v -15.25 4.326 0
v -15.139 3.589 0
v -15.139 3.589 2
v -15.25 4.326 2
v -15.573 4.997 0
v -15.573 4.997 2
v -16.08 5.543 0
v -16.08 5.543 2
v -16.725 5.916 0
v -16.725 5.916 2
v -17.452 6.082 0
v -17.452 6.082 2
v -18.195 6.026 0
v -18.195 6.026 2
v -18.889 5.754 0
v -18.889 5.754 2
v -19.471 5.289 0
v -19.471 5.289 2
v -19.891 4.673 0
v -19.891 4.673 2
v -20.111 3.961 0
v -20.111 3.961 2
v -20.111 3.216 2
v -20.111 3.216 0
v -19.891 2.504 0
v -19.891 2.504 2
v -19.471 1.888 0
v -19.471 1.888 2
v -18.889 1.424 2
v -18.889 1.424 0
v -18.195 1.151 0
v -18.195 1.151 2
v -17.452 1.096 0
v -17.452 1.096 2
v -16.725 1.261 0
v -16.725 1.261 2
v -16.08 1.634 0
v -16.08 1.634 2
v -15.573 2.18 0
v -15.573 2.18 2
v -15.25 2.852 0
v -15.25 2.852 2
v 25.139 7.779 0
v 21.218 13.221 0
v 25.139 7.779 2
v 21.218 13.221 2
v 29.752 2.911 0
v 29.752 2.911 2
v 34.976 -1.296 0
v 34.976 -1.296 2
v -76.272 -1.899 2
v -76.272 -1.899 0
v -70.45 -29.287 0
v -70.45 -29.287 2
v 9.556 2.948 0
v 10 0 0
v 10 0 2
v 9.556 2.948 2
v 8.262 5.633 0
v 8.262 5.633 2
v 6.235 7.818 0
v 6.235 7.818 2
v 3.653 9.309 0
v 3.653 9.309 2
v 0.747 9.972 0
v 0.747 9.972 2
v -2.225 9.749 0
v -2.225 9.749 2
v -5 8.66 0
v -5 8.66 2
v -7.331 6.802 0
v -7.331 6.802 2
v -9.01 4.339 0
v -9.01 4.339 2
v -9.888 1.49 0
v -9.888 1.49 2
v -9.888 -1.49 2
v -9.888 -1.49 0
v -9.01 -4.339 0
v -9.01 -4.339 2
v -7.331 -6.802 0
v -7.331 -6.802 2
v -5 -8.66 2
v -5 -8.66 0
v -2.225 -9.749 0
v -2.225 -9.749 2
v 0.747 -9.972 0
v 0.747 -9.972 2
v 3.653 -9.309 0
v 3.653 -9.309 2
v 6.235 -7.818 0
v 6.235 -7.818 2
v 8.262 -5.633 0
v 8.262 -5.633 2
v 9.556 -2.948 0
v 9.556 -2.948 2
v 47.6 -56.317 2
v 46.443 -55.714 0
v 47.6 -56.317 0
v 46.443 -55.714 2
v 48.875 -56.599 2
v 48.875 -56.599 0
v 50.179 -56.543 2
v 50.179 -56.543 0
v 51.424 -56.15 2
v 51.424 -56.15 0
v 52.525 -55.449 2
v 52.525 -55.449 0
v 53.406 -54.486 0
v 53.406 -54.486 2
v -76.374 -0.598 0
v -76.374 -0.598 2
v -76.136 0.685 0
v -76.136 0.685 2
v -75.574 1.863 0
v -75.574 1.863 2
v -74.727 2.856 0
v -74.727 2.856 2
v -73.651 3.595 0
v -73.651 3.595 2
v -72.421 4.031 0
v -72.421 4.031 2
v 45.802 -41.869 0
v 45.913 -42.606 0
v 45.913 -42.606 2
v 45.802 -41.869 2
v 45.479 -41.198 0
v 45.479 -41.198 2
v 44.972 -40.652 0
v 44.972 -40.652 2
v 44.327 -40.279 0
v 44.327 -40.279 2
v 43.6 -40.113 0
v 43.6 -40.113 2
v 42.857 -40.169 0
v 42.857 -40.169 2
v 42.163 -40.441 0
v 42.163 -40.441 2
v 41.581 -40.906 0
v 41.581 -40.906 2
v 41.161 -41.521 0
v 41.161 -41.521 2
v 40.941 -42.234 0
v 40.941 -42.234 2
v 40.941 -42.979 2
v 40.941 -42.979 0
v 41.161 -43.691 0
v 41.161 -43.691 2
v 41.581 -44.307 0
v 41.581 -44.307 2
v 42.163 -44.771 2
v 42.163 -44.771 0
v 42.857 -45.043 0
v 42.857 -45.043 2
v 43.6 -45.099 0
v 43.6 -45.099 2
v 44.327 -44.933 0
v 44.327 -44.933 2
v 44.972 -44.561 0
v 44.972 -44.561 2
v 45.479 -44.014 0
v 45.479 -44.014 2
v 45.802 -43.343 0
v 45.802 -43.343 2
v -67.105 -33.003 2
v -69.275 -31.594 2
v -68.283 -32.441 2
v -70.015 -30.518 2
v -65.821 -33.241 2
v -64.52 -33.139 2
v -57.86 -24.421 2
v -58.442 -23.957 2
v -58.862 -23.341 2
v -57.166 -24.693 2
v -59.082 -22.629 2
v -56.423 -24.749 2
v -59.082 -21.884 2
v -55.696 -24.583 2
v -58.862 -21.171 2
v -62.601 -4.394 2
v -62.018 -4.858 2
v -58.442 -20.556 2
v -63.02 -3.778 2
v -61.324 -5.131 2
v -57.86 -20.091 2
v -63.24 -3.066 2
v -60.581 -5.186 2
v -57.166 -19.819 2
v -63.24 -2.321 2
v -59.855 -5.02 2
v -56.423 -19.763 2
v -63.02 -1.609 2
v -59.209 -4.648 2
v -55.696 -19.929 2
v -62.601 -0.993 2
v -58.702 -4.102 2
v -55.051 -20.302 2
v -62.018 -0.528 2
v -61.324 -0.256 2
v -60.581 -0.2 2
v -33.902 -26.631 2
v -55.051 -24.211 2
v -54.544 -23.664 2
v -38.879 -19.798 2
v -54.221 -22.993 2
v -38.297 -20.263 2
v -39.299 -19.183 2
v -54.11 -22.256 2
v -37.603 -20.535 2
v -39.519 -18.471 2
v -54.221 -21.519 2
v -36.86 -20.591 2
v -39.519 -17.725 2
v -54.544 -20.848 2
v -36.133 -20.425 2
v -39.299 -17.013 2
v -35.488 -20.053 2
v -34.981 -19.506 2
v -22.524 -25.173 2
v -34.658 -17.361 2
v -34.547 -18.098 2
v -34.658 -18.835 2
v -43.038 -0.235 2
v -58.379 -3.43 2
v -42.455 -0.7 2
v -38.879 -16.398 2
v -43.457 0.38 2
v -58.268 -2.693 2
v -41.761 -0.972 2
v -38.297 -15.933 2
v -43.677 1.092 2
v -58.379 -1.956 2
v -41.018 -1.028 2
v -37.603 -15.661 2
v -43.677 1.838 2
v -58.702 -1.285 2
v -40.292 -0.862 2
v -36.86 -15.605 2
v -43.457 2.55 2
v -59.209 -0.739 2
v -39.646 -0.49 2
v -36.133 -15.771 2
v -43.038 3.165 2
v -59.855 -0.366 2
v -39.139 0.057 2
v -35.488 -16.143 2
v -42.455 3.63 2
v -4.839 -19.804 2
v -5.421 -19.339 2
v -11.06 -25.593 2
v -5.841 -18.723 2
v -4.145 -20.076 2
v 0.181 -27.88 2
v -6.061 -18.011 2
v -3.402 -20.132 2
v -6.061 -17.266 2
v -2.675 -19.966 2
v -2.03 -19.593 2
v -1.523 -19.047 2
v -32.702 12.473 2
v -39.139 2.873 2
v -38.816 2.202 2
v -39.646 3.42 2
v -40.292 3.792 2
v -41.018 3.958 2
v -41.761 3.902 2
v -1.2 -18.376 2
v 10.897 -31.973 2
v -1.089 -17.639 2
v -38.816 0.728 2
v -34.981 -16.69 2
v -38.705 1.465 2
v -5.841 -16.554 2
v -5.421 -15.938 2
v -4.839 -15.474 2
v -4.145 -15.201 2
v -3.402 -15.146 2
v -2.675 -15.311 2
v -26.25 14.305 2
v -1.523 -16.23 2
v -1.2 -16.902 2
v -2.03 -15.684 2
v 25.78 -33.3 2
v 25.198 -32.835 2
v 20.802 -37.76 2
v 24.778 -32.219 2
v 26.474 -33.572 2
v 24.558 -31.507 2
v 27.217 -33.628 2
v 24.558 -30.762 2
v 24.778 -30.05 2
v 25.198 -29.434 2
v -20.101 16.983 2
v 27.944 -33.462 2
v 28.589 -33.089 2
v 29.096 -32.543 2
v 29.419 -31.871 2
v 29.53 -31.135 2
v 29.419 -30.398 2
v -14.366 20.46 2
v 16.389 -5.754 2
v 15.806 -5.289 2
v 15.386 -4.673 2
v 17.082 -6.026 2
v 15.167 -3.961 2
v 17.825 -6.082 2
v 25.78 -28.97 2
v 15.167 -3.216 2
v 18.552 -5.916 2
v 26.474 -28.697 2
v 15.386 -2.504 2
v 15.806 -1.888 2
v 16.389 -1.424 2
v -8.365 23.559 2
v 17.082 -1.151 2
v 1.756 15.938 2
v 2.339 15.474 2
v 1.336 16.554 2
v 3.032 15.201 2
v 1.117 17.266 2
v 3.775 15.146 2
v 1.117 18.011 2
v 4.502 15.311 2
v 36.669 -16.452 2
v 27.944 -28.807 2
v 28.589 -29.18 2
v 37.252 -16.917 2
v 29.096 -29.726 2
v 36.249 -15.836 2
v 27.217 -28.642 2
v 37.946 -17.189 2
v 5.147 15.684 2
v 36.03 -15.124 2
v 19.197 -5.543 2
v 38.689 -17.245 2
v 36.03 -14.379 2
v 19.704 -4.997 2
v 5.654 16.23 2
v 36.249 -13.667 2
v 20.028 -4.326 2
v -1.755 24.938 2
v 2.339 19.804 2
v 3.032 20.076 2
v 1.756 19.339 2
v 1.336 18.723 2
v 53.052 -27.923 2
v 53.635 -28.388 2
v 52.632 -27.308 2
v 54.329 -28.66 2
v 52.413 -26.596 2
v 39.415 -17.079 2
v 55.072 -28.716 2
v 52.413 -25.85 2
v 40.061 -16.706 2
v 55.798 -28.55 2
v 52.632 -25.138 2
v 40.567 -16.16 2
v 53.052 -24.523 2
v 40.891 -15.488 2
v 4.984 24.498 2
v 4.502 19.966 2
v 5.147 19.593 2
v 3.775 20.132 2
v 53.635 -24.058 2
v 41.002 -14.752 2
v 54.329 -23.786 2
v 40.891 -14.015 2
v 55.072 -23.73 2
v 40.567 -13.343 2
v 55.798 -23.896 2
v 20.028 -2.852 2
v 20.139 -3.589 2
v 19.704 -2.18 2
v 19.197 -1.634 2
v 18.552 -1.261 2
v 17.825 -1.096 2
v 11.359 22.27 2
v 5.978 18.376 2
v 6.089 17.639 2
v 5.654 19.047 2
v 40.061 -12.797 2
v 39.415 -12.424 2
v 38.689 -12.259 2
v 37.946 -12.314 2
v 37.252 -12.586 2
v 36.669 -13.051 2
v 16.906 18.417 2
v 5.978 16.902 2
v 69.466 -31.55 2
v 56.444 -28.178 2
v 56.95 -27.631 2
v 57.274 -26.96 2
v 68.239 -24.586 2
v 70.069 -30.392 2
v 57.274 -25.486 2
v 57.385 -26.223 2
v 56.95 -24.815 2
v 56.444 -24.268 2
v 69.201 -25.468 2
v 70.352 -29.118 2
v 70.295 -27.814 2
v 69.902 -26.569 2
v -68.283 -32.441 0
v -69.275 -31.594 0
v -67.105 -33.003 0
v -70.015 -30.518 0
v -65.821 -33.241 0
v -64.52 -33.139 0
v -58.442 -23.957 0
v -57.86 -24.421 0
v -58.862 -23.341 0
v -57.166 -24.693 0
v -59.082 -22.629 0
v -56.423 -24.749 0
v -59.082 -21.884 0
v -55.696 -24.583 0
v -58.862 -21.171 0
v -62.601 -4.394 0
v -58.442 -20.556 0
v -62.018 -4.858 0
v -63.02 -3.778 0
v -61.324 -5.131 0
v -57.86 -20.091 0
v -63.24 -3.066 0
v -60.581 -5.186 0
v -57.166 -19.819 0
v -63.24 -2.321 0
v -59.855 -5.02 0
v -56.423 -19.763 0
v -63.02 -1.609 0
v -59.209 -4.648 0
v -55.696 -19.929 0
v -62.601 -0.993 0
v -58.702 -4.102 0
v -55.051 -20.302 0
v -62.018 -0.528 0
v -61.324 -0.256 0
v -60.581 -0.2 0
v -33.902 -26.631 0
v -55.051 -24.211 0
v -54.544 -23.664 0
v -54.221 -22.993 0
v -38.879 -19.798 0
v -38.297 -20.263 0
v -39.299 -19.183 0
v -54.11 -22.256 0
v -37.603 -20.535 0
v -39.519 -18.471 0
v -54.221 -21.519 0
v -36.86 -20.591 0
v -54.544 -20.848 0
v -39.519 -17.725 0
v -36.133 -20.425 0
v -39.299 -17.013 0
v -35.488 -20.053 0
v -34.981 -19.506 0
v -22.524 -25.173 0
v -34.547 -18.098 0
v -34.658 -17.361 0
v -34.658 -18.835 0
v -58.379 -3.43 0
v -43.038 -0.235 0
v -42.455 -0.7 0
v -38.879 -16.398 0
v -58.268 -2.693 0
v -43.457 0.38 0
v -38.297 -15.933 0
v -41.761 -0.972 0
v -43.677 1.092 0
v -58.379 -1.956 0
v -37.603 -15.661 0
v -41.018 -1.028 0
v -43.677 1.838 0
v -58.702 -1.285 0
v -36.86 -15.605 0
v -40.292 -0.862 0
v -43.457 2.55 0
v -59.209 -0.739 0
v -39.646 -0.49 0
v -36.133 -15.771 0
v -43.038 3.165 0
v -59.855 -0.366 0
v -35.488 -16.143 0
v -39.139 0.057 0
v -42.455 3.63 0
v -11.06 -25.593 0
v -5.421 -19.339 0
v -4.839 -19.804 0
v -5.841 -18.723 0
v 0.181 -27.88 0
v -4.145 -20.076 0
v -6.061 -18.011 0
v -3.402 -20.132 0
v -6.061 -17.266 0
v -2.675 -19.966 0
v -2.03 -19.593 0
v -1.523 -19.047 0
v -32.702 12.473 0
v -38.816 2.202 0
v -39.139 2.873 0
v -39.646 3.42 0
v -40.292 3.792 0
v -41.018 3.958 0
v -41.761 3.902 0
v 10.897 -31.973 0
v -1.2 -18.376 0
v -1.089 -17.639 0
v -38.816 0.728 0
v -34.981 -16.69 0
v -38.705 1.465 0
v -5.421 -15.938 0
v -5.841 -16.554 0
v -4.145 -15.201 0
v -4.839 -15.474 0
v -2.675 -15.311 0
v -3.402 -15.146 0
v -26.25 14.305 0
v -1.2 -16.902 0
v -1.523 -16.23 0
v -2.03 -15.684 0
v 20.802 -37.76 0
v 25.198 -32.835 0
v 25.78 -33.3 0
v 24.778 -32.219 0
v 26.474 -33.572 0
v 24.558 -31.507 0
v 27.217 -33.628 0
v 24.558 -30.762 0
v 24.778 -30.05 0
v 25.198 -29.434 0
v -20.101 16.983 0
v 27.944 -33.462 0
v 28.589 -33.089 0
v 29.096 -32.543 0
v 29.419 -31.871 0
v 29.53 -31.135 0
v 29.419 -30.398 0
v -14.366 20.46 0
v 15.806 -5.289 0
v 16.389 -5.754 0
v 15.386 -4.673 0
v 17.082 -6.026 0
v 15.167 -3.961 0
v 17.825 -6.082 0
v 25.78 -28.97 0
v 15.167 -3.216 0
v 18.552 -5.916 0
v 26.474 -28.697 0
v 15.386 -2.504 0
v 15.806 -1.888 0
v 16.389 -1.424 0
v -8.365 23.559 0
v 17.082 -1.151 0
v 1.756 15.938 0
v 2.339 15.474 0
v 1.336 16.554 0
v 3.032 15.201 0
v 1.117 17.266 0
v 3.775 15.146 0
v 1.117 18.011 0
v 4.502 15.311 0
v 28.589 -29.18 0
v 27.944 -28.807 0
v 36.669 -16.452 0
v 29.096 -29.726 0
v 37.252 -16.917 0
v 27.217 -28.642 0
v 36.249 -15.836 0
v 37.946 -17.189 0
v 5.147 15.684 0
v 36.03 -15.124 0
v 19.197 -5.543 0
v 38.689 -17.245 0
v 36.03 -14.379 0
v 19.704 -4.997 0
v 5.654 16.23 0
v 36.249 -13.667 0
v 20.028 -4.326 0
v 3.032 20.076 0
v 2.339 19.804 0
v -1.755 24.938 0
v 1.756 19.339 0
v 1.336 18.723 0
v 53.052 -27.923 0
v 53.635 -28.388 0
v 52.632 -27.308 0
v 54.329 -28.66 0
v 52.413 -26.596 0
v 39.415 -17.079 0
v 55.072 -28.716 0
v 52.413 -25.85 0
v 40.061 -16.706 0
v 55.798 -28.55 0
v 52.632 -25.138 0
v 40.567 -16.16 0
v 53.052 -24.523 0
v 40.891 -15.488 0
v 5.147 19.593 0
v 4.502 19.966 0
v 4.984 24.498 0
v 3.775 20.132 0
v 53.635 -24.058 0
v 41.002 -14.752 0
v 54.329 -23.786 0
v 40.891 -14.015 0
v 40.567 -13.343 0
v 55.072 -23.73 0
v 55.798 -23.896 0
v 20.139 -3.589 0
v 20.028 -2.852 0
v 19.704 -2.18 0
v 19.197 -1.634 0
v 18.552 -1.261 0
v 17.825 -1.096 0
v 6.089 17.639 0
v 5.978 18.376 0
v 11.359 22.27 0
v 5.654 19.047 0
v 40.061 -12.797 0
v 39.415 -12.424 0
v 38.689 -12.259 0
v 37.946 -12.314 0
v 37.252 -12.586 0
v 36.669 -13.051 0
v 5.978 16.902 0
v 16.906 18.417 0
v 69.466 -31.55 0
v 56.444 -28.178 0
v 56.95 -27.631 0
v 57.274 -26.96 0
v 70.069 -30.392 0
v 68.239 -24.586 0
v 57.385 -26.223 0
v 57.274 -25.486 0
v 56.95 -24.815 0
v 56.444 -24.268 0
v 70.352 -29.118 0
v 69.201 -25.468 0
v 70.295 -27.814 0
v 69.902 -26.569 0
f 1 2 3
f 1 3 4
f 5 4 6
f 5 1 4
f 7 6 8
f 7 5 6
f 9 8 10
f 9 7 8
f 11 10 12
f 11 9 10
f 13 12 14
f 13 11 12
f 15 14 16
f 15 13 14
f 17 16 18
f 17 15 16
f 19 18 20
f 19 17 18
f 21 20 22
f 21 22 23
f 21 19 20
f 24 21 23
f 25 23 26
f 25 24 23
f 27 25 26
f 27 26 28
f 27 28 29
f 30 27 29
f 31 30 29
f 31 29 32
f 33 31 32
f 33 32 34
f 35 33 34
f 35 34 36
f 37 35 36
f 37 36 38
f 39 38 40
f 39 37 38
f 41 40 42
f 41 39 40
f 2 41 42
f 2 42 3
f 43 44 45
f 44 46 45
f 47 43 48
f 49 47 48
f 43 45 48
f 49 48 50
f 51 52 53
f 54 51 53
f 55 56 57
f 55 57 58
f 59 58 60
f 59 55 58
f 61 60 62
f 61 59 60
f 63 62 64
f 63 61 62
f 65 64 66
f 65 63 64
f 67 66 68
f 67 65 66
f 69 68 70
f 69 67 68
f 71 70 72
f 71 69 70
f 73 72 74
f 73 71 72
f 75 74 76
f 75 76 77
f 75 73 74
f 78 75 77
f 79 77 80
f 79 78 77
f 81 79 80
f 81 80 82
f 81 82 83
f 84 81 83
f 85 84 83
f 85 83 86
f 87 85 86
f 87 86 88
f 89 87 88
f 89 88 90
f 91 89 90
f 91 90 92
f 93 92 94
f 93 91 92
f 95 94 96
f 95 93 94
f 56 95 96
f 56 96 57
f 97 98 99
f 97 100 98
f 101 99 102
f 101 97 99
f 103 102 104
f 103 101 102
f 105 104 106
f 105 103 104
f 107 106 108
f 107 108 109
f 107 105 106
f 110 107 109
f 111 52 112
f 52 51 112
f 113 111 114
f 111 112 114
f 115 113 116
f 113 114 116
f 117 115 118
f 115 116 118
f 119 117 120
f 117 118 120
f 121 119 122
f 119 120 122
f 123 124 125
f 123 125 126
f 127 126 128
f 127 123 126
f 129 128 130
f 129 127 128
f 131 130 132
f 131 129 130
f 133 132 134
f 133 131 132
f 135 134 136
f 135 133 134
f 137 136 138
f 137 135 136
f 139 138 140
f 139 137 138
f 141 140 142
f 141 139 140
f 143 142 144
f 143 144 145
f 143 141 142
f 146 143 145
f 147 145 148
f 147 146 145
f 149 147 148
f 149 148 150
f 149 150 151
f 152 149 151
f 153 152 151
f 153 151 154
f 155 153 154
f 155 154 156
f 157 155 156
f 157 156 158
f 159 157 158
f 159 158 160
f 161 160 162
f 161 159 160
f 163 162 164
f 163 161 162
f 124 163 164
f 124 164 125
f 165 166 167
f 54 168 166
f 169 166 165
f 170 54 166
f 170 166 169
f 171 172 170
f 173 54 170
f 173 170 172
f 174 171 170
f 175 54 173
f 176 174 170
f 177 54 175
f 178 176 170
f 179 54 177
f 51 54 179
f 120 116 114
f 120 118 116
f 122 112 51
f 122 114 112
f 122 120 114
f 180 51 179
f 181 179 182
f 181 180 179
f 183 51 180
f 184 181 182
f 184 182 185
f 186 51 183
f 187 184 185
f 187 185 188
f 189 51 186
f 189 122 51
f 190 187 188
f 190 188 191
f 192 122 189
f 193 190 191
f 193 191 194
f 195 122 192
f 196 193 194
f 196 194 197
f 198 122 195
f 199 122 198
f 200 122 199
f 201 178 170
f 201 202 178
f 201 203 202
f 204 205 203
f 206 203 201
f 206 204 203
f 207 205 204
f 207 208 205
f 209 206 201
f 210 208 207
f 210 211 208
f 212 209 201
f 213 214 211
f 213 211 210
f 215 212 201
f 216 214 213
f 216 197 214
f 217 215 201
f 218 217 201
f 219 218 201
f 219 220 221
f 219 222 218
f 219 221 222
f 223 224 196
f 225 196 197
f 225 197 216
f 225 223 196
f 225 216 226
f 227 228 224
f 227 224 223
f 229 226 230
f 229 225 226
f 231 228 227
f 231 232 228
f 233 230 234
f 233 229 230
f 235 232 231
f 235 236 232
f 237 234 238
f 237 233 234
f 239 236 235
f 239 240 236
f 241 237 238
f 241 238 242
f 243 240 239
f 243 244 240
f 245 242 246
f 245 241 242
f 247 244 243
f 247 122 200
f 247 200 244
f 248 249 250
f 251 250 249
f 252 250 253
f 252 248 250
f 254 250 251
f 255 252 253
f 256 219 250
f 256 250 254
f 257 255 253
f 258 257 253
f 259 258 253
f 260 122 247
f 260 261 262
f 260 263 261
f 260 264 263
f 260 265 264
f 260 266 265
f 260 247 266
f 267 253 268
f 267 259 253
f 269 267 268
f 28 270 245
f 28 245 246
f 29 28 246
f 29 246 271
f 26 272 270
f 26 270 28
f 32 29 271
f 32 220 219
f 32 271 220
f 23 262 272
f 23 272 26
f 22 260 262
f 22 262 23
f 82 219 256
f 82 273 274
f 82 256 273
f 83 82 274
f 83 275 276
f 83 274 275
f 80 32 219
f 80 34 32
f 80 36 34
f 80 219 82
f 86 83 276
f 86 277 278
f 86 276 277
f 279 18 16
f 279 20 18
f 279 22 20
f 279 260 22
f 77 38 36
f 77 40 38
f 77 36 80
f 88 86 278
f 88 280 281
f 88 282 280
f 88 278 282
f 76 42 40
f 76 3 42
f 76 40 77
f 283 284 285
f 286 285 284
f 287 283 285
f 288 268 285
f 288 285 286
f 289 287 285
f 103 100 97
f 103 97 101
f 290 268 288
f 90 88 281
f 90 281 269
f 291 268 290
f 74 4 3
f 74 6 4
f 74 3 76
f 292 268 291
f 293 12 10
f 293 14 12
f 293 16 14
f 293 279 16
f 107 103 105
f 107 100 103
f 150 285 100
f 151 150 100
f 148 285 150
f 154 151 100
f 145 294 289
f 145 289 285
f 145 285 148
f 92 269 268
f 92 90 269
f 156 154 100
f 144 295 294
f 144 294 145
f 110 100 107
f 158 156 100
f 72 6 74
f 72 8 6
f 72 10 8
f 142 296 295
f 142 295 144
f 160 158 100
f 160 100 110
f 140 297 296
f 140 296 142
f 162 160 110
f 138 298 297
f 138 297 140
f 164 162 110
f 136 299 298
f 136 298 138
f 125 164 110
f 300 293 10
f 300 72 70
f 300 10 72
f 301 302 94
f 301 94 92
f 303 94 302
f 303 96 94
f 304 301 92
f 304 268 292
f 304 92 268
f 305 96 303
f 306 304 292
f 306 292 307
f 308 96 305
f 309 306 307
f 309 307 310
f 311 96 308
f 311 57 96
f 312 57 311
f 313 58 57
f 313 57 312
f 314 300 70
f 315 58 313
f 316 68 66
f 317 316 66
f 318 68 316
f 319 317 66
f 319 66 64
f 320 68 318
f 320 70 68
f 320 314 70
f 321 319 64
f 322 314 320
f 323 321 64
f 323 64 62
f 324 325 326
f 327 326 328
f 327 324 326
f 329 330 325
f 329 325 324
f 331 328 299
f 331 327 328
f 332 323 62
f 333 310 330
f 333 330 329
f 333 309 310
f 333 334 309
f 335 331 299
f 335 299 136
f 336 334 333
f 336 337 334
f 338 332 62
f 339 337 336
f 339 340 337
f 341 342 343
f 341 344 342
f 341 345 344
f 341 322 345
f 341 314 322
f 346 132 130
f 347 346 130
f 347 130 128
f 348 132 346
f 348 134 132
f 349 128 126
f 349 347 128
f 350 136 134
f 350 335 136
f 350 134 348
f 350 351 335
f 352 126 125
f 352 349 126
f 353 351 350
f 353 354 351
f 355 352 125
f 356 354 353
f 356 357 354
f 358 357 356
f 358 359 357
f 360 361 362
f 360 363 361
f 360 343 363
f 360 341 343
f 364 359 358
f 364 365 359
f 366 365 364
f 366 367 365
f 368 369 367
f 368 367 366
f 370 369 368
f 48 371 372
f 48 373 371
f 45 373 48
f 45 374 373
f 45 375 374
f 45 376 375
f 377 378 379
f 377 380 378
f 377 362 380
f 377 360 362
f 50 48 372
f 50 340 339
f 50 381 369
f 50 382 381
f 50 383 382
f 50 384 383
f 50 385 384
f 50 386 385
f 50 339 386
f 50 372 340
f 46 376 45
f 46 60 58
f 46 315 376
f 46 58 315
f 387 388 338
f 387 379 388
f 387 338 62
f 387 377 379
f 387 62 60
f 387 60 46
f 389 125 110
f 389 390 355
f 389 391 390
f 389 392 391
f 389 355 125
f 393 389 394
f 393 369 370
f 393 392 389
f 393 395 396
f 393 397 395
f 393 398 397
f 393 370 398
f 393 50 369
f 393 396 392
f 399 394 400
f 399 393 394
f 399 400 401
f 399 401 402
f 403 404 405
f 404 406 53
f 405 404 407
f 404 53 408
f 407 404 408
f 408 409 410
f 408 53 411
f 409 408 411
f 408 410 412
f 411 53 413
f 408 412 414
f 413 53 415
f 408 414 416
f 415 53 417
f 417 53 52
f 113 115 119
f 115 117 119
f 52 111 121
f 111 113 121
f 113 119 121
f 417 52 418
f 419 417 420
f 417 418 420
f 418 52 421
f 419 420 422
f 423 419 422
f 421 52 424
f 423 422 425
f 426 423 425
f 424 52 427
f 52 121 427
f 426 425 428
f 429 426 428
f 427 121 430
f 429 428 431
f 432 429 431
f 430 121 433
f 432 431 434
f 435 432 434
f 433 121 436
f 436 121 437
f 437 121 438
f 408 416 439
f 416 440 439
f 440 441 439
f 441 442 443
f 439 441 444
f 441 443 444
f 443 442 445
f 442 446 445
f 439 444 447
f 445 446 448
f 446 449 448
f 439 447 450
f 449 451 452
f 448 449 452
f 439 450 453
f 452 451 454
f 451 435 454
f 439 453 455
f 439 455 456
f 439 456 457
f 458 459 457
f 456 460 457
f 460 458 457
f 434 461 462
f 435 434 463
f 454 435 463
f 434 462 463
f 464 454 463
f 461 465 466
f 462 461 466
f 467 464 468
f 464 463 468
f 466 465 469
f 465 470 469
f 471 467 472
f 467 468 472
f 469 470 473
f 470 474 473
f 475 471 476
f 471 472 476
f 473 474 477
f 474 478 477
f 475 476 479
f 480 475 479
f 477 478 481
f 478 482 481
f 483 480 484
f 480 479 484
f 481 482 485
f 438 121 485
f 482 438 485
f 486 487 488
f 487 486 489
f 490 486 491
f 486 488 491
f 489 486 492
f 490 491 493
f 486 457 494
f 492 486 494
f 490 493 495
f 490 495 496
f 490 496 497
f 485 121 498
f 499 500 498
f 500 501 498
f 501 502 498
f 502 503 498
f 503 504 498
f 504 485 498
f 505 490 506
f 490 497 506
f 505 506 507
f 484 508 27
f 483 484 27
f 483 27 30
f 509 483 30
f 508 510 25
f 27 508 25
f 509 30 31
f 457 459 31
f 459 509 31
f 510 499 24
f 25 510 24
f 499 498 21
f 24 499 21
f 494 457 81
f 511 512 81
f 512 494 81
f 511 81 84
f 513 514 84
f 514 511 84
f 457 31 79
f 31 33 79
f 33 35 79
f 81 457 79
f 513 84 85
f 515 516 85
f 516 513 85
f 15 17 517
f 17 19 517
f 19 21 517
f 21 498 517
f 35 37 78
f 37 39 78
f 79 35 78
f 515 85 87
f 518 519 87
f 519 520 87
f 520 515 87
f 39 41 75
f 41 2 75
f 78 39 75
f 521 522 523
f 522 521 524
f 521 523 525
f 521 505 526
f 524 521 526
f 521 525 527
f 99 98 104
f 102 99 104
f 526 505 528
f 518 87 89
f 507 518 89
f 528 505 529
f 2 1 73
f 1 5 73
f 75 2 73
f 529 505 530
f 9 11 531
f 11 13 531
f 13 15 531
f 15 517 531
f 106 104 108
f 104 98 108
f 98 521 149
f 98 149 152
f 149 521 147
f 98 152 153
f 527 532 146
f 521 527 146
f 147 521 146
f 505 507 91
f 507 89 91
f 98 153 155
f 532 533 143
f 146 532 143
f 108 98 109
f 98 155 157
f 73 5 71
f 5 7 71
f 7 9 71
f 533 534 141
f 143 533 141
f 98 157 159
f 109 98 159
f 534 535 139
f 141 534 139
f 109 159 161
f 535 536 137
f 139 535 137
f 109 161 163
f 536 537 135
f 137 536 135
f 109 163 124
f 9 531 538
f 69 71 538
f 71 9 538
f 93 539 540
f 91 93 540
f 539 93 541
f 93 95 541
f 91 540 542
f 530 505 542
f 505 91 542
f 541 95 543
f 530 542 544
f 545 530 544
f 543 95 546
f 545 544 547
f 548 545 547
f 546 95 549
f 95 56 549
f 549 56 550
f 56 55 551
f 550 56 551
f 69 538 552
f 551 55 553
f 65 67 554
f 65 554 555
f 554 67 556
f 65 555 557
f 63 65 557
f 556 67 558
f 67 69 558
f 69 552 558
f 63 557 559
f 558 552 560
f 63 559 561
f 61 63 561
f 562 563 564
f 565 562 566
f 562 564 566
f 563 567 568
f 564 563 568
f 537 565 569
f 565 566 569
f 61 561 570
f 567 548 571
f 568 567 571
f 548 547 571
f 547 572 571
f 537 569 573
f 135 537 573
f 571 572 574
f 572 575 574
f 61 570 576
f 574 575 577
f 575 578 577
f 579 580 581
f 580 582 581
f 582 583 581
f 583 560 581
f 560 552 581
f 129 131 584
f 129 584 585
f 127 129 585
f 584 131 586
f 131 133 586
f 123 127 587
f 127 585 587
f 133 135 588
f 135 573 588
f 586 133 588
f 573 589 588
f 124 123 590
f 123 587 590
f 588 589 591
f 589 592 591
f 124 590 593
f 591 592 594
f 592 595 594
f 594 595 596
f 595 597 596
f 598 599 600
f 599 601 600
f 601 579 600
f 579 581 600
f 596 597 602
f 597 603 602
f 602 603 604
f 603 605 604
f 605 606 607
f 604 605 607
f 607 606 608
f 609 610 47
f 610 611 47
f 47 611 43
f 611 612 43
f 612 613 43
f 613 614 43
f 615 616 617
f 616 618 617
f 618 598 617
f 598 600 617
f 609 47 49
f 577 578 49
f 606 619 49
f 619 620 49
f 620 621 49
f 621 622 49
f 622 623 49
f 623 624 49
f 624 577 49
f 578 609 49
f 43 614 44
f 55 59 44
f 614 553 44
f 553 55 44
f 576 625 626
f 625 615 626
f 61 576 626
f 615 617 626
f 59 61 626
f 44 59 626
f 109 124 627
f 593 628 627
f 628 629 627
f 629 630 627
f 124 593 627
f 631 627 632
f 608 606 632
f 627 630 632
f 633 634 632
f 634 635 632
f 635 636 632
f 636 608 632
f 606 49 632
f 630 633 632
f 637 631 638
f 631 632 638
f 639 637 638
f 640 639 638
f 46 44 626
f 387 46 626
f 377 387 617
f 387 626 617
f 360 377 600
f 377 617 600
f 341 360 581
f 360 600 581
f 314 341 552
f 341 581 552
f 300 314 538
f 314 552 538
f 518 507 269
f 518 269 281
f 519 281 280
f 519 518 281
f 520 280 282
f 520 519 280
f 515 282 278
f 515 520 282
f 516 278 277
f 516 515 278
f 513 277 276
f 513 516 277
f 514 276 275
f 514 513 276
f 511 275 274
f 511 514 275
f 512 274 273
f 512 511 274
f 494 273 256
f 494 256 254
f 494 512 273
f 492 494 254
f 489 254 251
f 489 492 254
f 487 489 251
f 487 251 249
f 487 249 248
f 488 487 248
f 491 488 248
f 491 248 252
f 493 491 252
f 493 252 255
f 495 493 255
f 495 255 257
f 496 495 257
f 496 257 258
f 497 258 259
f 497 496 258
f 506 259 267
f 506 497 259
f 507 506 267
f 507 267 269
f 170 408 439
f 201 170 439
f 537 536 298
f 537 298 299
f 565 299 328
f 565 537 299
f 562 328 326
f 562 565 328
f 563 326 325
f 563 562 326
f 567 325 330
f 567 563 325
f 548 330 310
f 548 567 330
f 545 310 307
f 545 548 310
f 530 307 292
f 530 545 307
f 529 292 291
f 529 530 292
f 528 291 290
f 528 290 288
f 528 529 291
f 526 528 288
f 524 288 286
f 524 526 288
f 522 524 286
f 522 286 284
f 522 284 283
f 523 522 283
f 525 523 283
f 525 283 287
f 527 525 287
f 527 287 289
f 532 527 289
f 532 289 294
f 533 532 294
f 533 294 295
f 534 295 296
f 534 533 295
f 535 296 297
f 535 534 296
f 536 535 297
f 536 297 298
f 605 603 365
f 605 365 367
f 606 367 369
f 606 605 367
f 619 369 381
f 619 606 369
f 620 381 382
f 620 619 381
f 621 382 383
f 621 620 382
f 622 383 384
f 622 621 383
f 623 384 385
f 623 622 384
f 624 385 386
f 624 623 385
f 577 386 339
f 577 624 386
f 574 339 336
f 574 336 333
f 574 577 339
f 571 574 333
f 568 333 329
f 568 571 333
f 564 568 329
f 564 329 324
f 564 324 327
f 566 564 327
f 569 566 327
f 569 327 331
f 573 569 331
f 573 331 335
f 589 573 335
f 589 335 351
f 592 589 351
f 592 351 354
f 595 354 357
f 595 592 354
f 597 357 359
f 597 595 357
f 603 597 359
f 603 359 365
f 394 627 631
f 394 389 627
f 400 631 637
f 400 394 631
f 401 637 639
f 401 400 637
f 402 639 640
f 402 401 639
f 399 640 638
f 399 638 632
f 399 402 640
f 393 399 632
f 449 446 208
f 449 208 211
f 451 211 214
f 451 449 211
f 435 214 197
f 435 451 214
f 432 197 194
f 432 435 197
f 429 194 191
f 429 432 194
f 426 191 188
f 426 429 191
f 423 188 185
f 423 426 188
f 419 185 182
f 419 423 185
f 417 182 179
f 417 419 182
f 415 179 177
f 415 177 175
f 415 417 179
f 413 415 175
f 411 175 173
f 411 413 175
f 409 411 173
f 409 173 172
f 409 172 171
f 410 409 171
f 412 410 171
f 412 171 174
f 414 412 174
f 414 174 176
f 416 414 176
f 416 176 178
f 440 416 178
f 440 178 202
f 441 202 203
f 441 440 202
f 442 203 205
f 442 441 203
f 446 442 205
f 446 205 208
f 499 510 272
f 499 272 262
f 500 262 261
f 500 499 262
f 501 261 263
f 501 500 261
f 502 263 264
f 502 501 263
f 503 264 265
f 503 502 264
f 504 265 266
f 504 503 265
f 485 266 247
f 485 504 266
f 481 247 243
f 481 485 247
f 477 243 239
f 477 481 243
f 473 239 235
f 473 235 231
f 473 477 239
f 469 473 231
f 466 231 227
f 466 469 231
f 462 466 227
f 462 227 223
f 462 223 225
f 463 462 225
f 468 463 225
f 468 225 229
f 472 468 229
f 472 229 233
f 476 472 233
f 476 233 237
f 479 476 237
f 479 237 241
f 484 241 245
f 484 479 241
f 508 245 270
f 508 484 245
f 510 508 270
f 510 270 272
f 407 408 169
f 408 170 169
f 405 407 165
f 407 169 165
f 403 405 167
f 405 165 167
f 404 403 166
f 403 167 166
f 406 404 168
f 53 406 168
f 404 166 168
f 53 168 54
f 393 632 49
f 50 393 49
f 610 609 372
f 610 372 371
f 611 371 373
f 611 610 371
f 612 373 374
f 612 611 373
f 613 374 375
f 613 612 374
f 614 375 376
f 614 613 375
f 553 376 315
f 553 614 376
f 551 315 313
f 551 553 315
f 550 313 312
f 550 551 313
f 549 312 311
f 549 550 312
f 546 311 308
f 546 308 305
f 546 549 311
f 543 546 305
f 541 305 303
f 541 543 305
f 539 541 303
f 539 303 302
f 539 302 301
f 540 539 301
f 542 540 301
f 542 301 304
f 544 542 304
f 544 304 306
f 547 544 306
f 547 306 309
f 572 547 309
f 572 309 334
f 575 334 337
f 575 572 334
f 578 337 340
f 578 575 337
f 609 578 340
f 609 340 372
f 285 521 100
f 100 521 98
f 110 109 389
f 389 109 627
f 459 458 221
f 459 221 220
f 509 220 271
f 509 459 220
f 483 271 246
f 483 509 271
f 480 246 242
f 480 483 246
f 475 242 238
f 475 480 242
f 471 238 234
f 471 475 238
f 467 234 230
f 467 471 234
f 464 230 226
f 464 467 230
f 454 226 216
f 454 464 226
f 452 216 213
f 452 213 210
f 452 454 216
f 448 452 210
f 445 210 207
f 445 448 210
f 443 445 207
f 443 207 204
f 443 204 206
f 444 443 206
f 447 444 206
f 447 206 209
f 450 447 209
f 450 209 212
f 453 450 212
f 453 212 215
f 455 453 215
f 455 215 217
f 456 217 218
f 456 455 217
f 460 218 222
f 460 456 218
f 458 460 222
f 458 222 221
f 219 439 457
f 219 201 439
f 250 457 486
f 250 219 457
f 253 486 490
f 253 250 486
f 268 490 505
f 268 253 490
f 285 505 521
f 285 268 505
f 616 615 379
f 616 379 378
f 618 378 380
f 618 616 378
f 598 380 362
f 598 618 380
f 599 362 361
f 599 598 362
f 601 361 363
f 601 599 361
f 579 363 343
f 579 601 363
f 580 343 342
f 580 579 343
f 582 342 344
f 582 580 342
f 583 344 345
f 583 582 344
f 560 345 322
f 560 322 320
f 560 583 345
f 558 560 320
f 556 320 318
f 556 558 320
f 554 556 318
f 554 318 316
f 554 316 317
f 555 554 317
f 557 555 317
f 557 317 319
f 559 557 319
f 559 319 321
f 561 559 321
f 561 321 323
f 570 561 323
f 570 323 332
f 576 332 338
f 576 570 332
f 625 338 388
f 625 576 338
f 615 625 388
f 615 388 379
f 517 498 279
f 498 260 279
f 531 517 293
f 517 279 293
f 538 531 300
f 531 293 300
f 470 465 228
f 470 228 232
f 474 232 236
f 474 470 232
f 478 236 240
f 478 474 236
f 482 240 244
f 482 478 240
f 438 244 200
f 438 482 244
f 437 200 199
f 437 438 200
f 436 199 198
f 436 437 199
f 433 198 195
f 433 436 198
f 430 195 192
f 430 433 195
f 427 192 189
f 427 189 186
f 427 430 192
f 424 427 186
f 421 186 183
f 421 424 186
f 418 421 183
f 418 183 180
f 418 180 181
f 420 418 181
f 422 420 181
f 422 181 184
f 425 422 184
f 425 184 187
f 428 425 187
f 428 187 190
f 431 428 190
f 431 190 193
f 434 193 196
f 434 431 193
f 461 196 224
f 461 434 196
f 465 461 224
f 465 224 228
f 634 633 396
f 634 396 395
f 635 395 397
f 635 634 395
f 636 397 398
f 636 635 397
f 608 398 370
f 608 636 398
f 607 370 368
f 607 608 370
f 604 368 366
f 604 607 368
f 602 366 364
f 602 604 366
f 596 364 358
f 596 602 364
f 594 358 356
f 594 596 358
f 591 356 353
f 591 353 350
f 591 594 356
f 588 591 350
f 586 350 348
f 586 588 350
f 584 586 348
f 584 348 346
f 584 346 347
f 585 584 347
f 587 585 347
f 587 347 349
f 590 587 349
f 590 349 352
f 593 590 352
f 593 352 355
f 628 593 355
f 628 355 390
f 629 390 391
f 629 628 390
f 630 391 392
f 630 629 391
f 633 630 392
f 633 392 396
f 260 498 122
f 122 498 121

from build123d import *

# Parameters (mm, degrees)
SKETCH1_R           = 2.5
SKETCH1_R_2         = 10
BOSS_EXTRUDE1_DEPTH = 2
FILLET1_R           = 50
FILLET2_R           = 70
FILLET3_R           = 5


with BuildPart() as part:
    # Sketch1 → Boss-Extrude1 (new body)
    with BuildSketch(Plane.XY):
        with BuildLine():
            Line((-77.311392181, 2.991427603), (-69.410747929, -34.178181225))
            Line((-69.410747929, -34.178181225), (-4.13058082, -20.302453359))
            Line((-4.13058082, -20.302453359), (50.538451031, -58.582121568))
            Line((50.538451031, -58.582121568), (72.334355612, -27.454343885))
            Line((72.334355612, -27.454343885), (24.207597625, 6.244374848))
            ThreePointArc((24.207597625, 6.244374848), (4.98419836, 24.498117616), (-19.843339473, 15.206639292))
            Line((-19.843339473, 15.206639292), (-77.311392181, 2.991427603))
        make_face()
        with Locations((-60.767972952, -2.693225442)):
            Circle(SKETCH1_R, mode=Mode.SUBTRACT)
        with Locations((-56.609739136, -22.256177456)):
            Circle(SKETCH1_R, mode=Mode.SUBTRACT)
        with Locations((-37.046787121, -18.09794364)):
            Circle(SKETCH1_R, mode=Mode.SUBTRACT)
        with Locations((-41.205020938, 1.465008375)):
            Circle(SKETCH1_R, mode=Mode.SUBTRACT)
        with Locations((38.501846135, -14.751537011)):
            Circle(SKETCH1_R, mode=Mode.SUBTRACT)
        with Locations((27.030317408, -31.134577897)):
            Circle(SKETCH1_R, mode=Mode.SUBTRACT)
        with Locations((43.413358294, -42.606106624)):
            Circle(SKETCH1_R, mode=Mode.SUBTRACT)
        with Locations((54.884887021, -26.223065738)):
            Circle(SKETCH1_R, mode=Mode.SUBTRACT)
        Circle(SKETCH1_R_2, mode=Mode.SUBTRACT)
        with Locations((3.58862282, 17.638644683)):
            Circle(SKETCH1_R, mode=Mode.SUBTRACT)
        with Locations((17.638644683, -3.58862282)):
            Circle(SKETCH1_R, mode=Mode.SUBTRACT)
        with Locations((-3.58862282, -17.638644683)):
            Circle(SKETCH1_R, mode=Mode.SUBTRACT)
        with Locations((-17.638644683, 3.58862282)):
            Circle(SKETCH1_R, mode=Mode.SUBTRACT)
    extrude(amount=BOSS_EXTRUDE1_DEPTH)

    # Fillet1
    fillet1_edges = [part.edges().sort_by_distance(p)[0] for p in [
        (-19.843339473, 15.206639292, 1),
        (24.207597625, 6.244374848, 1),
    ]]
    fillet(fillet1_edges, radius=FILLET1_R)

    # Fillet2
    fillet2_edges = [part.edges().sort_by_distance(p)[0] for p in [
        (-4.13058082, -20.302453359, 1),
    ]]
    fillet(fillet2_edges, radius=FILLET2_R)

    # Fillet3
    fillet3_edges = [part.edges().sort_by_distance(p)[0] for p in [
        (72.334355612, -27.454343885, 1),
        (50.538451031, -58.582121568, 1),
        (-69.410747929, -34.178181225, 1),
        (-77.311392181, 2.991427603, 1),
    ]]
    fillet(fillet3_edges, radius=FILLET3_R)


solid = part.part
